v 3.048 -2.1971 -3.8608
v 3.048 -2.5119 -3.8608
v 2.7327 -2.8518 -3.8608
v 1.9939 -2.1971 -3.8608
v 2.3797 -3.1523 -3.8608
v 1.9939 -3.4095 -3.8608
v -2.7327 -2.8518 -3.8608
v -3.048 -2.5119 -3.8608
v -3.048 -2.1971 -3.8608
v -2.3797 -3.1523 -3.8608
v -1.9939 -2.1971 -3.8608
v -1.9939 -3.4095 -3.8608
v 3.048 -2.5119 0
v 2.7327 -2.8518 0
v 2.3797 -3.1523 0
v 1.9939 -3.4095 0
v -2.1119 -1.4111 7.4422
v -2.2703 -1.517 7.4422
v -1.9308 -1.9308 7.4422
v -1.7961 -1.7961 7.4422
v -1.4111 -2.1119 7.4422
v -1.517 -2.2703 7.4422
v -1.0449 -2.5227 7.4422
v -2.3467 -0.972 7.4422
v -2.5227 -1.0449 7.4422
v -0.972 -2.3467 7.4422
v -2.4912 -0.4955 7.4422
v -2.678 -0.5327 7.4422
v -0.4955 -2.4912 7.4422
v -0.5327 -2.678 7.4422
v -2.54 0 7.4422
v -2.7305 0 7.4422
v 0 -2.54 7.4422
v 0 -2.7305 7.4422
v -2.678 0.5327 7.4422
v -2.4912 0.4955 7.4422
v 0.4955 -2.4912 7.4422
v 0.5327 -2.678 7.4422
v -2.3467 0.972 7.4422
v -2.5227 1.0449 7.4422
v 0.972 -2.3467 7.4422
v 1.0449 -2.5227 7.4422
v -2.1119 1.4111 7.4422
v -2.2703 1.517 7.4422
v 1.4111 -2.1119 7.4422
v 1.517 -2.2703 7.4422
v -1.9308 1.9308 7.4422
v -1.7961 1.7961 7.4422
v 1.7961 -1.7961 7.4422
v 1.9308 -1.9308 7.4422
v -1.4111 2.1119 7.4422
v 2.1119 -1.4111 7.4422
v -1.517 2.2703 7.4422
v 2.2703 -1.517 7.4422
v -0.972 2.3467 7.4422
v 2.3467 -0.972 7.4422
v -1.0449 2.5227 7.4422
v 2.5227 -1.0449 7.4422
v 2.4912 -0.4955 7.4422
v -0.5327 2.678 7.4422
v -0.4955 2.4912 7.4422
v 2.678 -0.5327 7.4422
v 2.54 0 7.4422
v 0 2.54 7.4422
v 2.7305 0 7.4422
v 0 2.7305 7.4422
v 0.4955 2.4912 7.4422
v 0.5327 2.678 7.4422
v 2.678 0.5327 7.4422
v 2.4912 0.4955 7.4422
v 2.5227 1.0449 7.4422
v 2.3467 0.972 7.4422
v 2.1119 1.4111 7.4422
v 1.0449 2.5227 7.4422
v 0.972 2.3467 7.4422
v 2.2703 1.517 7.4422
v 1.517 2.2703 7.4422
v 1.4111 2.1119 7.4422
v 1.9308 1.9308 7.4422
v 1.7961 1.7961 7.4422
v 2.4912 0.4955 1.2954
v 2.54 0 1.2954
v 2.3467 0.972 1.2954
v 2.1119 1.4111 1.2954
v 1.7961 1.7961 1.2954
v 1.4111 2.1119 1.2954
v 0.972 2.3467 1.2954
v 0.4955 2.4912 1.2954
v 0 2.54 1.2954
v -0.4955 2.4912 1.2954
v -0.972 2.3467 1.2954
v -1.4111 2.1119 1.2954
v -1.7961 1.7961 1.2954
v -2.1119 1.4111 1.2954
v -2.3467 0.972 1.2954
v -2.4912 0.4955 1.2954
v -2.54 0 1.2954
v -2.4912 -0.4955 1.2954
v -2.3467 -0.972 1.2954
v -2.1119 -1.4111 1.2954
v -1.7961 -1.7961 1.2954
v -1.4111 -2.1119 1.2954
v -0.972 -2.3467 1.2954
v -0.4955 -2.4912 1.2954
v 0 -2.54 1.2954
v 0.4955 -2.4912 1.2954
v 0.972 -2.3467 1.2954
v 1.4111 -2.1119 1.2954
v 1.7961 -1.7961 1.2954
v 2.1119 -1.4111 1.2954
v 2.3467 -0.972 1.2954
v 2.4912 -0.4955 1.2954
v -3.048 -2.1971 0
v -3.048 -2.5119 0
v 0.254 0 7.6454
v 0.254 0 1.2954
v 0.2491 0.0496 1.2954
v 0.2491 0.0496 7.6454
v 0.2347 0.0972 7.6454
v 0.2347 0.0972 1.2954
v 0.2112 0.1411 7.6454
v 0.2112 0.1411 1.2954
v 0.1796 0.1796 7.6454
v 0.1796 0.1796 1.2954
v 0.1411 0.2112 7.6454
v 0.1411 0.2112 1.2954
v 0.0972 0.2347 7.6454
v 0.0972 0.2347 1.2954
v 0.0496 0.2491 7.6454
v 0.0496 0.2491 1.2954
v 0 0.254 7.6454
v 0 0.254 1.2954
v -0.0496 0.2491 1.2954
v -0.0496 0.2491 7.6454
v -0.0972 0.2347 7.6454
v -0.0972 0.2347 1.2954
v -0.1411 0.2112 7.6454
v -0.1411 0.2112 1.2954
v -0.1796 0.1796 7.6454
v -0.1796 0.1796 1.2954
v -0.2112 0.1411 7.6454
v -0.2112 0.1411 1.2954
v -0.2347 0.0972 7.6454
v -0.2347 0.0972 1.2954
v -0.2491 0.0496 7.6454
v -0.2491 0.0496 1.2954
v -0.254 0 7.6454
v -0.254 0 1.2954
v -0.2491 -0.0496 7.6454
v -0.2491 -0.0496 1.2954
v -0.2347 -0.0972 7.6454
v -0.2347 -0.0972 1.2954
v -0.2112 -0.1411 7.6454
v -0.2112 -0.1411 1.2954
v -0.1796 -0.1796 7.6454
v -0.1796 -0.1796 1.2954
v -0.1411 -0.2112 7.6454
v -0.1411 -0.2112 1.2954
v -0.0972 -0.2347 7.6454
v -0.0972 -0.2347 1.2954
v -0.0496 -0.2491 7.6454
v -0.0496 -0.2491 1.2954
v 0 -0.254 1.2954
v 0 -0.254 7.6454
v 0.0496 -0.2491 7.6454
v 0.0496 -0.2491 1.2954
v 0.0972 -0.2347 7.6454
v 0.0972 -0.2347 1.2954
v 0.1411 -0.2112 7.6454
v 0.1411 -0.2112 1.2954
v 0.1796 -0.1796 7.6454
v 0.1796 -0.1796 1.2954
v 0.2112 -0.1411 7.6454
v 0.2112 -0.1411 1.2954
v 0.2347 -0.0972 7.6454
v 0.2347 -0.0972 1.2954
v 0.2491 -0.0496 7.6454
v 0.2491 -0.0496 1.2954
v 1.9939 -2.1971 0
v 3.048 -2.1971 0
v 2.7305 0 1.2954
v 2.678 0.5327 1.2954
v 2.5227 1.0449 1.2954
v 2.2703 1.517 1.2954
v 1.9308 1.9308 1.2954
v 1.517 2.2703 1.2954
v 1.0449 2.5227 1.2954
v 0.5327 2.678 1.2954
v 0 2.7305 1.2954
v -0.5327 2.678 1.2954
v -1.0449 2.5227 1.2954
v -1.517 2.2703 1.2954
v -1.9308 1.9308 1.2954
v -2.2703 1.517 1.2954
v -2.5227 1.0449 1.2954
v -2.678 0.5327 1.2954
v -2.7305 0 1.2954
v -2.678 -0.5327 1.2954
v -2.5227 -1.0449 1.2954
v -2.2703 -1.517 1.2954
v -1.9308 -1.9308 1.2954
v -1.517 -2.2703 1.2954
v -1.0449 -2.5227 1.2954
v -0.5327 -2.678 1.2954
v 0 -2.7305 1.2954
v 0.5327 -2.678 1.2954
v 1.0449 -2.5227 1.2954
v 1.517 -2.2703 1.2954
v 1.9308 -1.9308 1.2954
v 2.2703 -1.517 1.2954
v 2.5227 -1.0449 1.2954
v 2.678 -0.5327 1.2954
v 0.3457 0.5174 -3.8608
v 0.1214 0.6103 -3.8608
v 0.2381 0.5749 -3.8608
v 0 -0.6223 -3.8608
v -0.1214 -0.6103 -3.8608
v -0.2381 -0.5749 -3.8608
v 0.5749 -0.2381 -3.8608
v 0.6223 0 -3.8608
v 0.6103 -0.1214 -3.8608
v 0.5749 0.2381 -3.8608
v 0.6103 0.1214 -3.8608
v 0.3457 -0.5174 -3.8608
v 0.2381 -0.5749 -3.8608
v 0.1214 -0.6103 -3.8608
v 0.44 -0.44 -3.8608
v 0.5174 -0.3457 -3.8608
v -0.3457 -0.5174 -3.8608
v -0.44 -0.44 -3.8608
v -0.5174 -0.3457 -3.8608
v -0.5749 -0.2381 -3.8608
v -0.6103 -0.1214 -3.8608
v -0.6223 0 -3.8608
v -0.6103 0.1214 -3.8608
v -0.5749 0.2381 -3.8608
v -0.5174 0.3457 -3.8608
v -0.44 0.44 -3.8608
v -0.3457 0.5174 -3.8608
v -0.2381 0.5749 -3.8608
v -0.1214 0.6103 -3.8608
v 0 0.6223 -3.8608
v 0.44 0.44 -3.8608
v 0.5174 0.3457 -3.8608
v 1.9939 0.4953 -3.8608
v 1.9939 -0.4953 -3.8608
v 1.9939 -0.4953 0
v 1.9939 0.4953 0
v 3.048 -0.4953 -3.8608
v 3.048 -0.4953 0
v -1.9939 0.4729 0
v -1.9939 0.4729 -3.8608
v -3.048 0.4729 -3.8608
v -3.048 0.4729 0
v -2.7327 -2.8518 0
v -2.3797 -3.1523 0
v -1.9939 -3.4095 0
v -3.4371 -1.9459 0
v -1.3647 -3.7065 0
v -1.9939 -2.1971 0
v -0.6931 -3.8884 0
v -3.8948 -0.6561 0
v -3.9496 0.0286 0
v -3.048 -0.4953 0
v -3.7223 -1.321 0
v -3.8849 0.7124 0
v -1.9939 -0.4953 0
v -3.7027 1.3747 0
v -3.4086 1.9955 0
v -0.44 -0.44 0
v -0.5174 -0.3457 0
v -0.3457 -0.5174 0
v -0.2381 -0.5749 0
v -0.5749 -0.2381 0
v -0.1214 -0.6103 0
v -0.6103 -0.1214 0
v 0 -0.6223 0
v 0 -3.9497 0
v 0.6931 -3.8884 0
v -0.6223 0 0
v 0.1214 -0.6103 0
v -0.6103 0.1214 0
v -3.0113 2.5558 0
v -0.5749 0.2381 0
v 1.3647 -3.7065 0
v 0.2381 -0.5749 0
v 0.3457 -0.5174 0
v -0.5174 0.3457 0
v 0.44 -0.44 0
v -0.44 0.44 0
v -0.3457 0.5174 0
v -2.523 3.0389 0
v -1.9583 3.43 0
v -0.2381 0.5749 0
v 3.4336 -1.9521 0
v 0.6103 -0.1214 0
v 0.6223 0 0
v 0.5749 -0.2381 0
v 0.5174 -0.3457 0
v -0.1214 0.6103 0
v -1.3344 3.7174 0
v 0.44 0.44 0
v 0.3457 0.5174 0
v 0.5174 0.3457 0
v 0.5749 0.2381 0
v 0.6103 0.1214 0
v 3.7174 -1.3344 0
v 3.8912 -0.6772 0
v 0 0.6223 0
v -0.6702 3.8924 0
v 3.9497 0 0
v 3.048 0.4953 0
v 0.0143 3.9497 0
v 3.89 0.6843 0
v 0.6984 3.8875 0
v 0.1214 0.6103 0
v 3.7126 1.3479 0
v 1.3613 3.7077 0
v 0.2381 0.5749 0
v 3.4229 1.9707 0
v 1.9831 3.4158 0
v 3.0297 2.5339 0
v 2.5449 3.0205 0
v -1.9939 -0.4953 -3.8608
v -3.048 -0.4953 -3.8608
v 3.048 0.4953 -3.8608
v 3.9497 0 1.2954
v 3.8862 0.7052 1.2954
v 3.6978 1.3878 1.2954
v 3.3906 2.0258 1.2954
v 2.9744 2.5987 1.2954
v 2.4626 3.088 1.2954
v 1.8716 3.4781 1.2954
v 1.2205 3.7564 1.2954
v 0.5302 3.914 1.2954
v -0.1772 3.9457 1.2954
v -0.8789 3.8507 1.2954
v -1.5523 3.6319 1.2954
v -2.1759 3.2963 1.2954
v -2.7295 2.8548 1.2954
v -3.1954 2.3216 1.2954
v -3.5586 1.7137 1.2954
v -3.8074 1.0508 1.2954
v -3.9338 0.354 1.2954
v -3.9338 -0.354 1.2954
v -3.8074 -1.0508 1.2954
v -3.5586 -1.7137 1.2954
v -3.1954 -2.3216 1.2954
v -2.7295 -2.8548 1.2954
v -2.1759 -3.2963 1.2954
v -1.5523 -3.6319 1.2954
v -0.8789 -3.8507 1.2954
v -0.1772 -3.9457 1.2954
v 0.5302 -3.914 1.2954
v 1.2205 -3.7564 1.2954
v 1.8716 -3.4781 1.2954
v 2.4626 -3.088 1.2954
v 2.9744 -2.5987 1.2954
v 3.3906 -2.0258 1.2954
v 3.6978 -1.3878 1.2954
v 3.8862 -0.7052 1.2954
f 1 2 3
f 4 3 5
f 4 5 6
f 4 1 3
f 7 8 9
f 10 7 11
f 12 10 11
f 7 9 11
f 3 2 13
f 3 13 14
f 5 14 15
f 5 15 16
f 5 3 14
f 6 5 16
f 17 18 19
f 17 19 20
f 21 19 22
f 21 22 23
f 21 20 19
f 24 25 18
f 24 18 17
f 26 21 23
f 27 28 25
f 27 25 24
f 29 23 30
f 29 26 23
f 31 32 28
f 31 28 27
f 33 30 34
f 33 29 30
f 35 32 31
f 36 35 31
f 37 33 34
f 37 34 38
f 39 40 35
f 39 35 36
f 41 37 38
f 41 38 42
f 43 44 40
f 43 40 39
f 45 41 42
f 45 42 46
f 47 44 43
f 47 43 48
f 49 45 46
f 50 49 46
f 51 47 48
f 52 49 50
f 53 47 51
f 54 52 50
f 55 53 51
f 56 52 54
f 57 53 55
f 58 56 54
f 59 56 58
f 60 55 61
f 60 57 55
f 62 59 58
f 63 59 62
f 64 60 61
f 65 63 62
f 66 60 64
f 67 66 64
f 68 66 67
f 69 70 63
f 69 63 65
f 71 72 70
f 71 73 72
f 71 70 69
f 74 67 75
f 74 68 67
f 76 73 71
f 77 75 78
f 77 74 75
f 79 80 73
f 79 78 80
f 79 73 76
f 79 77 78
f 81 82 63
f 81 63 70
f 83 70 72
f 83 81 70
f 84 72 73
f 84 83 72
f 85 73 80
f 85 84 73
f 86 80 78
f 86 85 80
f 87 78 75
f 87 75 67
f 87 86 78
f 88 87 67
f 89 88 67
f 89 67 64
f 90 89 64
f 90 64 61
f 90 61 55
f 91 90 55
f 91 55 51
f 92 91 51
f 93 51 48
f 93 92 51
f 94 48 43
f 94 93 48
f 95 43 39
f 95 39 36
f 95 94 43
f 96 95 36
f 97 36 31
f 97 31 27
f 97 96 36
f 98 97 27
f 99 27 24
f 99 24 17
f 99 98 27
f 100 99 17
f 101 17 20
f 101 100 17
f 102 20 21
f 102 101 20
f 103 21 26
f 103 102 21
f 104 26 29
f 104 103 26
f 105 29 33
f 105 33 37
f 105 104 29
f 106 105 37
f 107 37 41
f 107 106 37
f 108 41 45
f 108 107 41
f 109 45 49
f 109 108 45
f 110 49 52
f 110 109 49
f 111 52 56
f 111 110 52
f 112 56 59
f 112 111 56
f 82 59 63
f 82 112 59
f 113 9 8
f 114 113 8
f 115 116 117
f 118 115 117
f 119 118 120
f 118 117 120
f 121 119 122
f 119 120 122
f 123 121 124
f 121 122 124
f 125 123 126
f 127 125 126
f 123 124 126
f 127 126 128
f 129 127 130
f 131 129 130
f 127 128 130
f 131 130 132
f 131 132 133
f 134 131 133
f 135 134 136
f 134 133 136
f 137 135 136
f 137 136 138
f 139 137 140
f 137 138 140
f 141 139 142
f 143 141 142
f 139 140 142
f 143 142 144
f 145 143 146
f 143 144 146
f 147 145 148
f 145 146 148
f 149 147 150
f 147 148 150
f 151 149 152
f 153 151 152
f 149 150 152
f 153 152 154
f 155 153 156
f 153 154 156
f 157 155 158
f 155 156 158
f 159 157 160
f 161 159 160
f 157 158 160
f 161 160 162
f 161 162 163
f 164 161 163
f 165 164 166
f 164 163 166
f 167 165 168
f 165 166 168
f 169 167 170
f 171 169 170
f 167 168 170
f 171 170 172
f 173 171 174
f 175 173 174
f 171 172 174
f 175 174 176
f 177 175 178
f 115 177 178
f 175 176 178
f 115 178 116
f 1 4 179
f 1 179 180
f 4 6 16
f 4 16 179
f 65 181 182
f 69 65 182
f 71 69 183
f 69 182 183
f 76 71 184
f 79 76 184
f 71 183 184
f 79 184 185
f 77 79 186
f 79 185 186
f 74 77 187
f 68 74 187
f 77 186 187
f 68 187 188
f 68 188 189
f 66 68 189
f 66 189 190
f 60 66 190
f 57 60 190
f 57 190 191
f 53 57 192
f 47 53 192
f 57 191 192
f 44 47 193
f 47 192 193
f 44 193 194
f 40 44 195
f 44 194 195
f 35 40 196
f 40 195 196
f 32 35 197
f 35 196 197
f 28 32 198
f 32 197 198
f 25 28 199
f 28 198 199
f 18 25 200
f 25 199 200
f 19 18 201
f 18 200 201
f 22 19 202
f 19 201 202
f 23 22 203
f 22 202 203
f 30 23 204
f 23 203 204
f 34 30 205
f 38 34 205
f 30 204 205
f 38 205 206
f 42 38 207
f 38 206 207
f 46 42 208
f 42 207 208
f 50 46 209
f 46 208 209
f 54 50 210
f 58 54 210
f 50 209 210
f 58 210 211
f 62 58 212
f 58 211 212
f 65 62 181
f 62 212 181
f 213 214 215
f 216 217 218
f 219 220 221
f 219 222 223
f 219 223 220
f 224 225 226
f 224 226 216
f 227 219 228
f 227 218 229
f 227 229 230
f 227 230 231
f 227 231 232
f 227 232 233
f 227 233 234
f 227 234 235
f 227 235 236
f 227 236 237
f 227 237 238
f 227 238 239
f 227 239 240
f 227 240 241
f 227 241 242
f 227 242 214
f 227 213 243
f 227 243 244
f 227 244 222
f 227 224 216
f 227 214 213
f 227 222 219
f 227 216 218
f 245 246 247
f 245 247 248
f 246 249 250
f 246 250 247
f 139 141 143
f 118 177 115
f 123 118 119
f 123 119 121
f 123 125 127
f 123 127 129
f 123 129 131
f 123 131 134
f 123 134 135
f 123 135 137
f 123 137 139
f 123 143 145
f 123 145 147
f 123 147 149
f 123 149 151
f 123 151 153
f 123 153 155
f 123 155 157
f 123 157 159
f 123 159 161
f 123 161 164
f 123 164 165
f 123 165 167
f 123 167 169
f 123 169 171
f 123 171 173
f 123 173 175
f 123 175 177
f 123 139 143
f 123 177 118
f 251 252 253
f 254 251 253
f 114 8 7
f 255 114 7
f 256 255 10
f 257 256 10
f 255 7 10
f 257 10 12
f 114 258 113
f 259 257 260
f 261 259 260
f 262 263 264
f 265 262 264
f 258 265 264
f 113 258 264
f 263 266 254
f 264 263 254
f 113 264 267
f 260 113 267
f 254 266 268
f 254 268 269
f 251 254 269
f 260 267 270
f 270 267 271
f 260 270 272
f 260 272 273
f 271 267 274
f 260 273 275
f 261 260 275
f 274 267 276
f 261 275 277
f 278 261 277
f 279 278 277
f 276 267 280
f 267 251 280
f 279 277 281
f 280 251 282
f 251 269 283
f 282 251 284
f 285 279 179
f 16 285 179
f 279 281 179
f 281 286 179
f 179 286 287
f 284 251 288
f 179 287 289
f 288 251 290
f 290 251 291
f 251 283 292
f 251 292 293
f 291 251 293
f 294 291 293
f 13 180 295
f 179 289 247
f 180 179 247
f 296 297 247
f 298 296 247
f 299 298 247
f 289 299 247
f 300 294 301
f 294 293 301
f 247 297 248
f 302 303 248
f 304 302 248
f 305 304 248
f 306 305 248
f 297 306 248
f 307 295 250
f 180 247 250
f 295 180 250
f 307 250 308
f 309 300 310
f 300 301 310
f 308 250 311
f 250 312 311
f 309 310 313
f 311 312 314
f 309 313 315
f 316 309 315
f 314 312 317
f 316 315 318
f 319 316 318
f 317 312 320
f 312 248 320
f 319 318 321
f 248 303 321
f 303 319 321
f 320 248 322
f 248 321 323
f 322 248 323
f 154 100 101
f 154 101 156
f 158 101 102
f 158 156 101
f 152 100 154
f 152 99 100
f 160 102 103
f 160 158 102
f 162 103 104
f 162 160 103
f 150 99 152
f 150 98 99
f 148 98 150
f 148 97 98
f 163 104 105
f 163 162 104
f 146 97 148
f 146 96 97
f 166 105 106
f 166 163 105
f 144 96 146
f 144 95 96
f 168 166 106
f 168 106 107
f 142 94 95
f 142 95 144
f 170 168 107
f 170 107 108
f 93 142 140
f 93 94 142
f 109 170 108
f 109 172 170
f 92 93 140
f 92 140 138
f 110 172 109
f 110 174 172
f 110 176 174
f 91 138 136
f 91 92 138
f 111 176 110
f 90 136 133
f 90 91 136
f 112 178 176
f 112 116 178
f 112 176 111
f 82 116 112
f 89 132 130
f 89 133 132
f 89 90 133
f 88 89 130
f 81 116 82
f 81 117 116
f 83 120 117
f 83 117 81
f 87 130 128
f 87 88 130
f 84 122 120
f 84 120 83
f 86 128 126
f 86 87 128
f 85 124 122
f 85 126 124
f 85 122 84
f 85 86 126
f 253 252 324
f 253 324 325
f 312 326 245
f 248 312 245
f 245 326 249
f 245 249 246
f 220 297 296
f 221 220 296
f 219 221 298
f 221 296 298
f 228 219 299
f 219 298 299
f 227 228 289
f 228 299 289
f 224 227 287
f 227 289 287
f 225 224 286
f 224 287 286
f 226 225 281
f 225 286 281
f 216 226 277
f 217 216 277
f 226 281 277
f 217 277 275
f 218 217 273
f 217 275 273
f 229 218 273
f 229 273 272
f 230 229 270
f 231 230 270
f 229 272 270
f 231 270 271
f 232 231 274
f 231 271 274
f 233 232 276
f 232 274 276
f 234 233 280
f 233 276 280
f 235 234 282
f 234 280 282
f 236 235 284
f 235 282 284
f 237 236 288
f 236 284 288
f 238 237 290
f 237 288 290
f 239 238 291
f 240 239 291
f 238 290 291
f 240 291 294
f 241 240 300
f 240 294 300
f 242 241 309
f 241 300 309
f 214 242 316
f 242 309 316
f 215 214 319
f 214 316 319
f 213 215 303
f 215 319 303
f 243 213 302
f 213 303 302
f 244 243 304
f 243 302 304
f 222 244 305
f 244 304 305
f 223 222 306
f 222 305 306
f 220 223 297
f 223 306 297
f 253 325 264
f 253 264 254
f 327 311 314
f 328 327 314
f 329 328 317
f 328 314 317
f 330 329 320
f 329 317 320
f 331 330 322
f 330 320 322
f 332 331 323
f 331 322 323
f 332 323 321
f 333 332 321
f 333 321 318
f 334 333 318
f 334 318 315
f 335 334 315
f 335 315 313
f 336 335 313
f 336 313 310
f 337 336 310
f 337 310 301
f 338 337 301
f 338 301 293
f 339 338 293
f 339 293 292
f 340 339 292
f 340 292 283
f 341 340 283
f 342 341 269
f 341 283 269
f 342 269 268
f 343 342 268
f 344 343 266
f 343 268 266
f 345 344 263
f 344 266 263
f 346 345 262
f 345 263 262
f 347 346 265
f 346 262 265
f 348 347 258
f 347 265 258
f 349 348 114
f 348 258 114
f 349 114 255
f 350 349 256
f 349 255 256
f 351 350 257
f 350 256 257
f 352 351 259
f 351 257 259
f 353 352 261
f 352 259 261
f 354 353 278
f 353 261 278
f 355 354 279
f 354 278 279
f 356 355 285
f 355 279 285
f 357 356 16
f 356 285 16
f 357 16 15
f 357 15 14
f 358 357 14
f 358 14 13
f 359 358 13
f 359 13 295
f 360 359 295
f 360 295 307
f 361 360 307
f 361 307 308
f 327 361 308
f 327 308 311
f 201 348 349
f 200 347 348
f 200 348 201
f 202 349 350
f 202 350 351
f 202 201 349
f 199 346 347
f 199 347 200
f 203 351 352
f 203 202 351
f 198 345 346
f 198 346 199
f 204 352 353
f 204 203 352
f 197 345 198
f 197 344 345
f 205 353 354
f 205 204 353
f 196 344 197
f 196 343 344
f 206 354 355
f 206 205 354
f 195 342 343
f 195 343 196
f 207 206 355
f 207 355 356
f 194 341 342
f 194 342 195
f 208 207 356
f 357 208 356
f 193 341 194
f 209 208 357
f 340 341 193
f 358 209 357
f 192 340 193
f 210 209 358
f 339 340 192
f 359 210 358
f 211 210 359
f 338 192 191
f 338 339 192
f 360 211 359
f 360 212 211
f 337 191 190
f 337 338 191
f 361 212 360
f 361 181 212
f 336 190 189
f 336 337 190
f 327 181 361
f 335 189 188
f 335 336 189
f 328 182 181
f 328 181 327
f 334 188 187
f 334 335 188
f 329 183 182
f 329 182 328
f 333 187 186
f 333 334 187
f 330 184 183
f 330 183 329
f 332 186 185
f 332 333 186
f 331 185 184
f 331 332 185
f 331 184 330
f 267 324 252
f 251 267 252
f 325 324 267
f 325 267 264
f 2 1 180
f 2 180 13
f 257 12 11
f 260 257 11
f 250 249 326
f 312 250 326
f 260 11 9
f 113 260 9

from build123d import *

# Parameters (mm, degrees)
SKETCH1_R           = 3.9497
BOSS_EXTRUDE1_DEPTH = 1.2954
SKETCH2_R           = 2.7305
SKETCH2_R_2         = 2.54
BOSS_EXTRUDE2_DEPTH = 6.1468
BOSS_EXTRUDE3_START = 3.8608
SKETCH3_W           = 1.0541
SKETCH3_H           = 0.968198064
SKETCH3_H_2         = 0.9906
BOSS_EXTRUDE3_DEPTH = 3.8608
SKETCH4_R           = 0.6223
BOSS_EXTRUDE4_DEPTH = 3.8608
SKETCH5_R           = 0.254
BOSS_EXTRUDE5_DEPTH = 6.35


with BuildPart() as part:
    # Sketch1 → Boss-Extrude1 (new body)
    with BuildSketch(Plane.XY):
        Circle(SKETCH1_R)
    extrude(amount=BOSS_EXTRUDE1_DEPTH)

    # Sketch2 → Boss-Extrude2 (add)
    with BuildSketch(Plane.XY.offset(1.2954)):
        Circle(SKETCH2_R)
        Circle(SKETCH2_R_2, mode=Mode.SUBTRACT)
    extrude(amount=BOSS_EXTRUDE2_DEPTH)

    # Sketch3 → Boss-Extrude3 (add)
    with BuildSketch(Plane(origin=(0, 0, 0), x_dir=(-1, 0, 0), z_dir=(0, 0, -1)).offset(BOSS_EXTRUDE3_START)):
        with Locations((2.52095, -0.011200968)):
            Rectangle(SKETCH3_W, SKETCH3_H)
        with Locations((-2.52095, 0)):
            Rectangle(SKETCH3_W, SKETCH3_H_2)
        with BuildLine():
            Line((-1.9939, -3.409471056), (-1.9939, -2.1971))
            Line((-1.9939, -2.1971), (-3.048, -2.1971))
            Line((-3.048, -2.1971), (-3.048, -2.511936721))
            ThreePointArc((-3.048, -2.511936721), (-2.560582136, -3.007249444), (-1.9939, -3.409471056))
        make_face()
        with BuildLine():
            Line((1.9939, -2.1971), (3.048, -2.1971))
            Line((3.048, -2.1971), (3.048, -2.511936721))
            ThreePointArc((3.048, -2.511936721), (2.560582136, -3.007249444), (1.9939, -3.409471056))
            Line((1.9939, -3.409471056), (1.9939, -2.1971))
        make_face()
    extrude(amount=-BOSS_EXTRUDE3_DEPTH)

    # Sketch4 → Boss-Extrude4 (add)
    with BuildSketch(Plane(origin=(0, 0, 0), x_dir=(-1, 0, 0), z_dir=(0, 0, -1))):
        with Locations(Location((0, 0, 0), (0, 0, 180))):
            Circle(SKETCH4_R)
    extrude(amount=BOSS_EXTRUDE4_DEPTH)

    # Sketch5 → Boss-Extrude5 (add)
    with BuildSketch(Plane.XY.offset(1.2954)):
        Circle(SKETCH5_R)
    extrude(amount=BOSS_EXTRUDE5_DEPTH)


solid = part.part
